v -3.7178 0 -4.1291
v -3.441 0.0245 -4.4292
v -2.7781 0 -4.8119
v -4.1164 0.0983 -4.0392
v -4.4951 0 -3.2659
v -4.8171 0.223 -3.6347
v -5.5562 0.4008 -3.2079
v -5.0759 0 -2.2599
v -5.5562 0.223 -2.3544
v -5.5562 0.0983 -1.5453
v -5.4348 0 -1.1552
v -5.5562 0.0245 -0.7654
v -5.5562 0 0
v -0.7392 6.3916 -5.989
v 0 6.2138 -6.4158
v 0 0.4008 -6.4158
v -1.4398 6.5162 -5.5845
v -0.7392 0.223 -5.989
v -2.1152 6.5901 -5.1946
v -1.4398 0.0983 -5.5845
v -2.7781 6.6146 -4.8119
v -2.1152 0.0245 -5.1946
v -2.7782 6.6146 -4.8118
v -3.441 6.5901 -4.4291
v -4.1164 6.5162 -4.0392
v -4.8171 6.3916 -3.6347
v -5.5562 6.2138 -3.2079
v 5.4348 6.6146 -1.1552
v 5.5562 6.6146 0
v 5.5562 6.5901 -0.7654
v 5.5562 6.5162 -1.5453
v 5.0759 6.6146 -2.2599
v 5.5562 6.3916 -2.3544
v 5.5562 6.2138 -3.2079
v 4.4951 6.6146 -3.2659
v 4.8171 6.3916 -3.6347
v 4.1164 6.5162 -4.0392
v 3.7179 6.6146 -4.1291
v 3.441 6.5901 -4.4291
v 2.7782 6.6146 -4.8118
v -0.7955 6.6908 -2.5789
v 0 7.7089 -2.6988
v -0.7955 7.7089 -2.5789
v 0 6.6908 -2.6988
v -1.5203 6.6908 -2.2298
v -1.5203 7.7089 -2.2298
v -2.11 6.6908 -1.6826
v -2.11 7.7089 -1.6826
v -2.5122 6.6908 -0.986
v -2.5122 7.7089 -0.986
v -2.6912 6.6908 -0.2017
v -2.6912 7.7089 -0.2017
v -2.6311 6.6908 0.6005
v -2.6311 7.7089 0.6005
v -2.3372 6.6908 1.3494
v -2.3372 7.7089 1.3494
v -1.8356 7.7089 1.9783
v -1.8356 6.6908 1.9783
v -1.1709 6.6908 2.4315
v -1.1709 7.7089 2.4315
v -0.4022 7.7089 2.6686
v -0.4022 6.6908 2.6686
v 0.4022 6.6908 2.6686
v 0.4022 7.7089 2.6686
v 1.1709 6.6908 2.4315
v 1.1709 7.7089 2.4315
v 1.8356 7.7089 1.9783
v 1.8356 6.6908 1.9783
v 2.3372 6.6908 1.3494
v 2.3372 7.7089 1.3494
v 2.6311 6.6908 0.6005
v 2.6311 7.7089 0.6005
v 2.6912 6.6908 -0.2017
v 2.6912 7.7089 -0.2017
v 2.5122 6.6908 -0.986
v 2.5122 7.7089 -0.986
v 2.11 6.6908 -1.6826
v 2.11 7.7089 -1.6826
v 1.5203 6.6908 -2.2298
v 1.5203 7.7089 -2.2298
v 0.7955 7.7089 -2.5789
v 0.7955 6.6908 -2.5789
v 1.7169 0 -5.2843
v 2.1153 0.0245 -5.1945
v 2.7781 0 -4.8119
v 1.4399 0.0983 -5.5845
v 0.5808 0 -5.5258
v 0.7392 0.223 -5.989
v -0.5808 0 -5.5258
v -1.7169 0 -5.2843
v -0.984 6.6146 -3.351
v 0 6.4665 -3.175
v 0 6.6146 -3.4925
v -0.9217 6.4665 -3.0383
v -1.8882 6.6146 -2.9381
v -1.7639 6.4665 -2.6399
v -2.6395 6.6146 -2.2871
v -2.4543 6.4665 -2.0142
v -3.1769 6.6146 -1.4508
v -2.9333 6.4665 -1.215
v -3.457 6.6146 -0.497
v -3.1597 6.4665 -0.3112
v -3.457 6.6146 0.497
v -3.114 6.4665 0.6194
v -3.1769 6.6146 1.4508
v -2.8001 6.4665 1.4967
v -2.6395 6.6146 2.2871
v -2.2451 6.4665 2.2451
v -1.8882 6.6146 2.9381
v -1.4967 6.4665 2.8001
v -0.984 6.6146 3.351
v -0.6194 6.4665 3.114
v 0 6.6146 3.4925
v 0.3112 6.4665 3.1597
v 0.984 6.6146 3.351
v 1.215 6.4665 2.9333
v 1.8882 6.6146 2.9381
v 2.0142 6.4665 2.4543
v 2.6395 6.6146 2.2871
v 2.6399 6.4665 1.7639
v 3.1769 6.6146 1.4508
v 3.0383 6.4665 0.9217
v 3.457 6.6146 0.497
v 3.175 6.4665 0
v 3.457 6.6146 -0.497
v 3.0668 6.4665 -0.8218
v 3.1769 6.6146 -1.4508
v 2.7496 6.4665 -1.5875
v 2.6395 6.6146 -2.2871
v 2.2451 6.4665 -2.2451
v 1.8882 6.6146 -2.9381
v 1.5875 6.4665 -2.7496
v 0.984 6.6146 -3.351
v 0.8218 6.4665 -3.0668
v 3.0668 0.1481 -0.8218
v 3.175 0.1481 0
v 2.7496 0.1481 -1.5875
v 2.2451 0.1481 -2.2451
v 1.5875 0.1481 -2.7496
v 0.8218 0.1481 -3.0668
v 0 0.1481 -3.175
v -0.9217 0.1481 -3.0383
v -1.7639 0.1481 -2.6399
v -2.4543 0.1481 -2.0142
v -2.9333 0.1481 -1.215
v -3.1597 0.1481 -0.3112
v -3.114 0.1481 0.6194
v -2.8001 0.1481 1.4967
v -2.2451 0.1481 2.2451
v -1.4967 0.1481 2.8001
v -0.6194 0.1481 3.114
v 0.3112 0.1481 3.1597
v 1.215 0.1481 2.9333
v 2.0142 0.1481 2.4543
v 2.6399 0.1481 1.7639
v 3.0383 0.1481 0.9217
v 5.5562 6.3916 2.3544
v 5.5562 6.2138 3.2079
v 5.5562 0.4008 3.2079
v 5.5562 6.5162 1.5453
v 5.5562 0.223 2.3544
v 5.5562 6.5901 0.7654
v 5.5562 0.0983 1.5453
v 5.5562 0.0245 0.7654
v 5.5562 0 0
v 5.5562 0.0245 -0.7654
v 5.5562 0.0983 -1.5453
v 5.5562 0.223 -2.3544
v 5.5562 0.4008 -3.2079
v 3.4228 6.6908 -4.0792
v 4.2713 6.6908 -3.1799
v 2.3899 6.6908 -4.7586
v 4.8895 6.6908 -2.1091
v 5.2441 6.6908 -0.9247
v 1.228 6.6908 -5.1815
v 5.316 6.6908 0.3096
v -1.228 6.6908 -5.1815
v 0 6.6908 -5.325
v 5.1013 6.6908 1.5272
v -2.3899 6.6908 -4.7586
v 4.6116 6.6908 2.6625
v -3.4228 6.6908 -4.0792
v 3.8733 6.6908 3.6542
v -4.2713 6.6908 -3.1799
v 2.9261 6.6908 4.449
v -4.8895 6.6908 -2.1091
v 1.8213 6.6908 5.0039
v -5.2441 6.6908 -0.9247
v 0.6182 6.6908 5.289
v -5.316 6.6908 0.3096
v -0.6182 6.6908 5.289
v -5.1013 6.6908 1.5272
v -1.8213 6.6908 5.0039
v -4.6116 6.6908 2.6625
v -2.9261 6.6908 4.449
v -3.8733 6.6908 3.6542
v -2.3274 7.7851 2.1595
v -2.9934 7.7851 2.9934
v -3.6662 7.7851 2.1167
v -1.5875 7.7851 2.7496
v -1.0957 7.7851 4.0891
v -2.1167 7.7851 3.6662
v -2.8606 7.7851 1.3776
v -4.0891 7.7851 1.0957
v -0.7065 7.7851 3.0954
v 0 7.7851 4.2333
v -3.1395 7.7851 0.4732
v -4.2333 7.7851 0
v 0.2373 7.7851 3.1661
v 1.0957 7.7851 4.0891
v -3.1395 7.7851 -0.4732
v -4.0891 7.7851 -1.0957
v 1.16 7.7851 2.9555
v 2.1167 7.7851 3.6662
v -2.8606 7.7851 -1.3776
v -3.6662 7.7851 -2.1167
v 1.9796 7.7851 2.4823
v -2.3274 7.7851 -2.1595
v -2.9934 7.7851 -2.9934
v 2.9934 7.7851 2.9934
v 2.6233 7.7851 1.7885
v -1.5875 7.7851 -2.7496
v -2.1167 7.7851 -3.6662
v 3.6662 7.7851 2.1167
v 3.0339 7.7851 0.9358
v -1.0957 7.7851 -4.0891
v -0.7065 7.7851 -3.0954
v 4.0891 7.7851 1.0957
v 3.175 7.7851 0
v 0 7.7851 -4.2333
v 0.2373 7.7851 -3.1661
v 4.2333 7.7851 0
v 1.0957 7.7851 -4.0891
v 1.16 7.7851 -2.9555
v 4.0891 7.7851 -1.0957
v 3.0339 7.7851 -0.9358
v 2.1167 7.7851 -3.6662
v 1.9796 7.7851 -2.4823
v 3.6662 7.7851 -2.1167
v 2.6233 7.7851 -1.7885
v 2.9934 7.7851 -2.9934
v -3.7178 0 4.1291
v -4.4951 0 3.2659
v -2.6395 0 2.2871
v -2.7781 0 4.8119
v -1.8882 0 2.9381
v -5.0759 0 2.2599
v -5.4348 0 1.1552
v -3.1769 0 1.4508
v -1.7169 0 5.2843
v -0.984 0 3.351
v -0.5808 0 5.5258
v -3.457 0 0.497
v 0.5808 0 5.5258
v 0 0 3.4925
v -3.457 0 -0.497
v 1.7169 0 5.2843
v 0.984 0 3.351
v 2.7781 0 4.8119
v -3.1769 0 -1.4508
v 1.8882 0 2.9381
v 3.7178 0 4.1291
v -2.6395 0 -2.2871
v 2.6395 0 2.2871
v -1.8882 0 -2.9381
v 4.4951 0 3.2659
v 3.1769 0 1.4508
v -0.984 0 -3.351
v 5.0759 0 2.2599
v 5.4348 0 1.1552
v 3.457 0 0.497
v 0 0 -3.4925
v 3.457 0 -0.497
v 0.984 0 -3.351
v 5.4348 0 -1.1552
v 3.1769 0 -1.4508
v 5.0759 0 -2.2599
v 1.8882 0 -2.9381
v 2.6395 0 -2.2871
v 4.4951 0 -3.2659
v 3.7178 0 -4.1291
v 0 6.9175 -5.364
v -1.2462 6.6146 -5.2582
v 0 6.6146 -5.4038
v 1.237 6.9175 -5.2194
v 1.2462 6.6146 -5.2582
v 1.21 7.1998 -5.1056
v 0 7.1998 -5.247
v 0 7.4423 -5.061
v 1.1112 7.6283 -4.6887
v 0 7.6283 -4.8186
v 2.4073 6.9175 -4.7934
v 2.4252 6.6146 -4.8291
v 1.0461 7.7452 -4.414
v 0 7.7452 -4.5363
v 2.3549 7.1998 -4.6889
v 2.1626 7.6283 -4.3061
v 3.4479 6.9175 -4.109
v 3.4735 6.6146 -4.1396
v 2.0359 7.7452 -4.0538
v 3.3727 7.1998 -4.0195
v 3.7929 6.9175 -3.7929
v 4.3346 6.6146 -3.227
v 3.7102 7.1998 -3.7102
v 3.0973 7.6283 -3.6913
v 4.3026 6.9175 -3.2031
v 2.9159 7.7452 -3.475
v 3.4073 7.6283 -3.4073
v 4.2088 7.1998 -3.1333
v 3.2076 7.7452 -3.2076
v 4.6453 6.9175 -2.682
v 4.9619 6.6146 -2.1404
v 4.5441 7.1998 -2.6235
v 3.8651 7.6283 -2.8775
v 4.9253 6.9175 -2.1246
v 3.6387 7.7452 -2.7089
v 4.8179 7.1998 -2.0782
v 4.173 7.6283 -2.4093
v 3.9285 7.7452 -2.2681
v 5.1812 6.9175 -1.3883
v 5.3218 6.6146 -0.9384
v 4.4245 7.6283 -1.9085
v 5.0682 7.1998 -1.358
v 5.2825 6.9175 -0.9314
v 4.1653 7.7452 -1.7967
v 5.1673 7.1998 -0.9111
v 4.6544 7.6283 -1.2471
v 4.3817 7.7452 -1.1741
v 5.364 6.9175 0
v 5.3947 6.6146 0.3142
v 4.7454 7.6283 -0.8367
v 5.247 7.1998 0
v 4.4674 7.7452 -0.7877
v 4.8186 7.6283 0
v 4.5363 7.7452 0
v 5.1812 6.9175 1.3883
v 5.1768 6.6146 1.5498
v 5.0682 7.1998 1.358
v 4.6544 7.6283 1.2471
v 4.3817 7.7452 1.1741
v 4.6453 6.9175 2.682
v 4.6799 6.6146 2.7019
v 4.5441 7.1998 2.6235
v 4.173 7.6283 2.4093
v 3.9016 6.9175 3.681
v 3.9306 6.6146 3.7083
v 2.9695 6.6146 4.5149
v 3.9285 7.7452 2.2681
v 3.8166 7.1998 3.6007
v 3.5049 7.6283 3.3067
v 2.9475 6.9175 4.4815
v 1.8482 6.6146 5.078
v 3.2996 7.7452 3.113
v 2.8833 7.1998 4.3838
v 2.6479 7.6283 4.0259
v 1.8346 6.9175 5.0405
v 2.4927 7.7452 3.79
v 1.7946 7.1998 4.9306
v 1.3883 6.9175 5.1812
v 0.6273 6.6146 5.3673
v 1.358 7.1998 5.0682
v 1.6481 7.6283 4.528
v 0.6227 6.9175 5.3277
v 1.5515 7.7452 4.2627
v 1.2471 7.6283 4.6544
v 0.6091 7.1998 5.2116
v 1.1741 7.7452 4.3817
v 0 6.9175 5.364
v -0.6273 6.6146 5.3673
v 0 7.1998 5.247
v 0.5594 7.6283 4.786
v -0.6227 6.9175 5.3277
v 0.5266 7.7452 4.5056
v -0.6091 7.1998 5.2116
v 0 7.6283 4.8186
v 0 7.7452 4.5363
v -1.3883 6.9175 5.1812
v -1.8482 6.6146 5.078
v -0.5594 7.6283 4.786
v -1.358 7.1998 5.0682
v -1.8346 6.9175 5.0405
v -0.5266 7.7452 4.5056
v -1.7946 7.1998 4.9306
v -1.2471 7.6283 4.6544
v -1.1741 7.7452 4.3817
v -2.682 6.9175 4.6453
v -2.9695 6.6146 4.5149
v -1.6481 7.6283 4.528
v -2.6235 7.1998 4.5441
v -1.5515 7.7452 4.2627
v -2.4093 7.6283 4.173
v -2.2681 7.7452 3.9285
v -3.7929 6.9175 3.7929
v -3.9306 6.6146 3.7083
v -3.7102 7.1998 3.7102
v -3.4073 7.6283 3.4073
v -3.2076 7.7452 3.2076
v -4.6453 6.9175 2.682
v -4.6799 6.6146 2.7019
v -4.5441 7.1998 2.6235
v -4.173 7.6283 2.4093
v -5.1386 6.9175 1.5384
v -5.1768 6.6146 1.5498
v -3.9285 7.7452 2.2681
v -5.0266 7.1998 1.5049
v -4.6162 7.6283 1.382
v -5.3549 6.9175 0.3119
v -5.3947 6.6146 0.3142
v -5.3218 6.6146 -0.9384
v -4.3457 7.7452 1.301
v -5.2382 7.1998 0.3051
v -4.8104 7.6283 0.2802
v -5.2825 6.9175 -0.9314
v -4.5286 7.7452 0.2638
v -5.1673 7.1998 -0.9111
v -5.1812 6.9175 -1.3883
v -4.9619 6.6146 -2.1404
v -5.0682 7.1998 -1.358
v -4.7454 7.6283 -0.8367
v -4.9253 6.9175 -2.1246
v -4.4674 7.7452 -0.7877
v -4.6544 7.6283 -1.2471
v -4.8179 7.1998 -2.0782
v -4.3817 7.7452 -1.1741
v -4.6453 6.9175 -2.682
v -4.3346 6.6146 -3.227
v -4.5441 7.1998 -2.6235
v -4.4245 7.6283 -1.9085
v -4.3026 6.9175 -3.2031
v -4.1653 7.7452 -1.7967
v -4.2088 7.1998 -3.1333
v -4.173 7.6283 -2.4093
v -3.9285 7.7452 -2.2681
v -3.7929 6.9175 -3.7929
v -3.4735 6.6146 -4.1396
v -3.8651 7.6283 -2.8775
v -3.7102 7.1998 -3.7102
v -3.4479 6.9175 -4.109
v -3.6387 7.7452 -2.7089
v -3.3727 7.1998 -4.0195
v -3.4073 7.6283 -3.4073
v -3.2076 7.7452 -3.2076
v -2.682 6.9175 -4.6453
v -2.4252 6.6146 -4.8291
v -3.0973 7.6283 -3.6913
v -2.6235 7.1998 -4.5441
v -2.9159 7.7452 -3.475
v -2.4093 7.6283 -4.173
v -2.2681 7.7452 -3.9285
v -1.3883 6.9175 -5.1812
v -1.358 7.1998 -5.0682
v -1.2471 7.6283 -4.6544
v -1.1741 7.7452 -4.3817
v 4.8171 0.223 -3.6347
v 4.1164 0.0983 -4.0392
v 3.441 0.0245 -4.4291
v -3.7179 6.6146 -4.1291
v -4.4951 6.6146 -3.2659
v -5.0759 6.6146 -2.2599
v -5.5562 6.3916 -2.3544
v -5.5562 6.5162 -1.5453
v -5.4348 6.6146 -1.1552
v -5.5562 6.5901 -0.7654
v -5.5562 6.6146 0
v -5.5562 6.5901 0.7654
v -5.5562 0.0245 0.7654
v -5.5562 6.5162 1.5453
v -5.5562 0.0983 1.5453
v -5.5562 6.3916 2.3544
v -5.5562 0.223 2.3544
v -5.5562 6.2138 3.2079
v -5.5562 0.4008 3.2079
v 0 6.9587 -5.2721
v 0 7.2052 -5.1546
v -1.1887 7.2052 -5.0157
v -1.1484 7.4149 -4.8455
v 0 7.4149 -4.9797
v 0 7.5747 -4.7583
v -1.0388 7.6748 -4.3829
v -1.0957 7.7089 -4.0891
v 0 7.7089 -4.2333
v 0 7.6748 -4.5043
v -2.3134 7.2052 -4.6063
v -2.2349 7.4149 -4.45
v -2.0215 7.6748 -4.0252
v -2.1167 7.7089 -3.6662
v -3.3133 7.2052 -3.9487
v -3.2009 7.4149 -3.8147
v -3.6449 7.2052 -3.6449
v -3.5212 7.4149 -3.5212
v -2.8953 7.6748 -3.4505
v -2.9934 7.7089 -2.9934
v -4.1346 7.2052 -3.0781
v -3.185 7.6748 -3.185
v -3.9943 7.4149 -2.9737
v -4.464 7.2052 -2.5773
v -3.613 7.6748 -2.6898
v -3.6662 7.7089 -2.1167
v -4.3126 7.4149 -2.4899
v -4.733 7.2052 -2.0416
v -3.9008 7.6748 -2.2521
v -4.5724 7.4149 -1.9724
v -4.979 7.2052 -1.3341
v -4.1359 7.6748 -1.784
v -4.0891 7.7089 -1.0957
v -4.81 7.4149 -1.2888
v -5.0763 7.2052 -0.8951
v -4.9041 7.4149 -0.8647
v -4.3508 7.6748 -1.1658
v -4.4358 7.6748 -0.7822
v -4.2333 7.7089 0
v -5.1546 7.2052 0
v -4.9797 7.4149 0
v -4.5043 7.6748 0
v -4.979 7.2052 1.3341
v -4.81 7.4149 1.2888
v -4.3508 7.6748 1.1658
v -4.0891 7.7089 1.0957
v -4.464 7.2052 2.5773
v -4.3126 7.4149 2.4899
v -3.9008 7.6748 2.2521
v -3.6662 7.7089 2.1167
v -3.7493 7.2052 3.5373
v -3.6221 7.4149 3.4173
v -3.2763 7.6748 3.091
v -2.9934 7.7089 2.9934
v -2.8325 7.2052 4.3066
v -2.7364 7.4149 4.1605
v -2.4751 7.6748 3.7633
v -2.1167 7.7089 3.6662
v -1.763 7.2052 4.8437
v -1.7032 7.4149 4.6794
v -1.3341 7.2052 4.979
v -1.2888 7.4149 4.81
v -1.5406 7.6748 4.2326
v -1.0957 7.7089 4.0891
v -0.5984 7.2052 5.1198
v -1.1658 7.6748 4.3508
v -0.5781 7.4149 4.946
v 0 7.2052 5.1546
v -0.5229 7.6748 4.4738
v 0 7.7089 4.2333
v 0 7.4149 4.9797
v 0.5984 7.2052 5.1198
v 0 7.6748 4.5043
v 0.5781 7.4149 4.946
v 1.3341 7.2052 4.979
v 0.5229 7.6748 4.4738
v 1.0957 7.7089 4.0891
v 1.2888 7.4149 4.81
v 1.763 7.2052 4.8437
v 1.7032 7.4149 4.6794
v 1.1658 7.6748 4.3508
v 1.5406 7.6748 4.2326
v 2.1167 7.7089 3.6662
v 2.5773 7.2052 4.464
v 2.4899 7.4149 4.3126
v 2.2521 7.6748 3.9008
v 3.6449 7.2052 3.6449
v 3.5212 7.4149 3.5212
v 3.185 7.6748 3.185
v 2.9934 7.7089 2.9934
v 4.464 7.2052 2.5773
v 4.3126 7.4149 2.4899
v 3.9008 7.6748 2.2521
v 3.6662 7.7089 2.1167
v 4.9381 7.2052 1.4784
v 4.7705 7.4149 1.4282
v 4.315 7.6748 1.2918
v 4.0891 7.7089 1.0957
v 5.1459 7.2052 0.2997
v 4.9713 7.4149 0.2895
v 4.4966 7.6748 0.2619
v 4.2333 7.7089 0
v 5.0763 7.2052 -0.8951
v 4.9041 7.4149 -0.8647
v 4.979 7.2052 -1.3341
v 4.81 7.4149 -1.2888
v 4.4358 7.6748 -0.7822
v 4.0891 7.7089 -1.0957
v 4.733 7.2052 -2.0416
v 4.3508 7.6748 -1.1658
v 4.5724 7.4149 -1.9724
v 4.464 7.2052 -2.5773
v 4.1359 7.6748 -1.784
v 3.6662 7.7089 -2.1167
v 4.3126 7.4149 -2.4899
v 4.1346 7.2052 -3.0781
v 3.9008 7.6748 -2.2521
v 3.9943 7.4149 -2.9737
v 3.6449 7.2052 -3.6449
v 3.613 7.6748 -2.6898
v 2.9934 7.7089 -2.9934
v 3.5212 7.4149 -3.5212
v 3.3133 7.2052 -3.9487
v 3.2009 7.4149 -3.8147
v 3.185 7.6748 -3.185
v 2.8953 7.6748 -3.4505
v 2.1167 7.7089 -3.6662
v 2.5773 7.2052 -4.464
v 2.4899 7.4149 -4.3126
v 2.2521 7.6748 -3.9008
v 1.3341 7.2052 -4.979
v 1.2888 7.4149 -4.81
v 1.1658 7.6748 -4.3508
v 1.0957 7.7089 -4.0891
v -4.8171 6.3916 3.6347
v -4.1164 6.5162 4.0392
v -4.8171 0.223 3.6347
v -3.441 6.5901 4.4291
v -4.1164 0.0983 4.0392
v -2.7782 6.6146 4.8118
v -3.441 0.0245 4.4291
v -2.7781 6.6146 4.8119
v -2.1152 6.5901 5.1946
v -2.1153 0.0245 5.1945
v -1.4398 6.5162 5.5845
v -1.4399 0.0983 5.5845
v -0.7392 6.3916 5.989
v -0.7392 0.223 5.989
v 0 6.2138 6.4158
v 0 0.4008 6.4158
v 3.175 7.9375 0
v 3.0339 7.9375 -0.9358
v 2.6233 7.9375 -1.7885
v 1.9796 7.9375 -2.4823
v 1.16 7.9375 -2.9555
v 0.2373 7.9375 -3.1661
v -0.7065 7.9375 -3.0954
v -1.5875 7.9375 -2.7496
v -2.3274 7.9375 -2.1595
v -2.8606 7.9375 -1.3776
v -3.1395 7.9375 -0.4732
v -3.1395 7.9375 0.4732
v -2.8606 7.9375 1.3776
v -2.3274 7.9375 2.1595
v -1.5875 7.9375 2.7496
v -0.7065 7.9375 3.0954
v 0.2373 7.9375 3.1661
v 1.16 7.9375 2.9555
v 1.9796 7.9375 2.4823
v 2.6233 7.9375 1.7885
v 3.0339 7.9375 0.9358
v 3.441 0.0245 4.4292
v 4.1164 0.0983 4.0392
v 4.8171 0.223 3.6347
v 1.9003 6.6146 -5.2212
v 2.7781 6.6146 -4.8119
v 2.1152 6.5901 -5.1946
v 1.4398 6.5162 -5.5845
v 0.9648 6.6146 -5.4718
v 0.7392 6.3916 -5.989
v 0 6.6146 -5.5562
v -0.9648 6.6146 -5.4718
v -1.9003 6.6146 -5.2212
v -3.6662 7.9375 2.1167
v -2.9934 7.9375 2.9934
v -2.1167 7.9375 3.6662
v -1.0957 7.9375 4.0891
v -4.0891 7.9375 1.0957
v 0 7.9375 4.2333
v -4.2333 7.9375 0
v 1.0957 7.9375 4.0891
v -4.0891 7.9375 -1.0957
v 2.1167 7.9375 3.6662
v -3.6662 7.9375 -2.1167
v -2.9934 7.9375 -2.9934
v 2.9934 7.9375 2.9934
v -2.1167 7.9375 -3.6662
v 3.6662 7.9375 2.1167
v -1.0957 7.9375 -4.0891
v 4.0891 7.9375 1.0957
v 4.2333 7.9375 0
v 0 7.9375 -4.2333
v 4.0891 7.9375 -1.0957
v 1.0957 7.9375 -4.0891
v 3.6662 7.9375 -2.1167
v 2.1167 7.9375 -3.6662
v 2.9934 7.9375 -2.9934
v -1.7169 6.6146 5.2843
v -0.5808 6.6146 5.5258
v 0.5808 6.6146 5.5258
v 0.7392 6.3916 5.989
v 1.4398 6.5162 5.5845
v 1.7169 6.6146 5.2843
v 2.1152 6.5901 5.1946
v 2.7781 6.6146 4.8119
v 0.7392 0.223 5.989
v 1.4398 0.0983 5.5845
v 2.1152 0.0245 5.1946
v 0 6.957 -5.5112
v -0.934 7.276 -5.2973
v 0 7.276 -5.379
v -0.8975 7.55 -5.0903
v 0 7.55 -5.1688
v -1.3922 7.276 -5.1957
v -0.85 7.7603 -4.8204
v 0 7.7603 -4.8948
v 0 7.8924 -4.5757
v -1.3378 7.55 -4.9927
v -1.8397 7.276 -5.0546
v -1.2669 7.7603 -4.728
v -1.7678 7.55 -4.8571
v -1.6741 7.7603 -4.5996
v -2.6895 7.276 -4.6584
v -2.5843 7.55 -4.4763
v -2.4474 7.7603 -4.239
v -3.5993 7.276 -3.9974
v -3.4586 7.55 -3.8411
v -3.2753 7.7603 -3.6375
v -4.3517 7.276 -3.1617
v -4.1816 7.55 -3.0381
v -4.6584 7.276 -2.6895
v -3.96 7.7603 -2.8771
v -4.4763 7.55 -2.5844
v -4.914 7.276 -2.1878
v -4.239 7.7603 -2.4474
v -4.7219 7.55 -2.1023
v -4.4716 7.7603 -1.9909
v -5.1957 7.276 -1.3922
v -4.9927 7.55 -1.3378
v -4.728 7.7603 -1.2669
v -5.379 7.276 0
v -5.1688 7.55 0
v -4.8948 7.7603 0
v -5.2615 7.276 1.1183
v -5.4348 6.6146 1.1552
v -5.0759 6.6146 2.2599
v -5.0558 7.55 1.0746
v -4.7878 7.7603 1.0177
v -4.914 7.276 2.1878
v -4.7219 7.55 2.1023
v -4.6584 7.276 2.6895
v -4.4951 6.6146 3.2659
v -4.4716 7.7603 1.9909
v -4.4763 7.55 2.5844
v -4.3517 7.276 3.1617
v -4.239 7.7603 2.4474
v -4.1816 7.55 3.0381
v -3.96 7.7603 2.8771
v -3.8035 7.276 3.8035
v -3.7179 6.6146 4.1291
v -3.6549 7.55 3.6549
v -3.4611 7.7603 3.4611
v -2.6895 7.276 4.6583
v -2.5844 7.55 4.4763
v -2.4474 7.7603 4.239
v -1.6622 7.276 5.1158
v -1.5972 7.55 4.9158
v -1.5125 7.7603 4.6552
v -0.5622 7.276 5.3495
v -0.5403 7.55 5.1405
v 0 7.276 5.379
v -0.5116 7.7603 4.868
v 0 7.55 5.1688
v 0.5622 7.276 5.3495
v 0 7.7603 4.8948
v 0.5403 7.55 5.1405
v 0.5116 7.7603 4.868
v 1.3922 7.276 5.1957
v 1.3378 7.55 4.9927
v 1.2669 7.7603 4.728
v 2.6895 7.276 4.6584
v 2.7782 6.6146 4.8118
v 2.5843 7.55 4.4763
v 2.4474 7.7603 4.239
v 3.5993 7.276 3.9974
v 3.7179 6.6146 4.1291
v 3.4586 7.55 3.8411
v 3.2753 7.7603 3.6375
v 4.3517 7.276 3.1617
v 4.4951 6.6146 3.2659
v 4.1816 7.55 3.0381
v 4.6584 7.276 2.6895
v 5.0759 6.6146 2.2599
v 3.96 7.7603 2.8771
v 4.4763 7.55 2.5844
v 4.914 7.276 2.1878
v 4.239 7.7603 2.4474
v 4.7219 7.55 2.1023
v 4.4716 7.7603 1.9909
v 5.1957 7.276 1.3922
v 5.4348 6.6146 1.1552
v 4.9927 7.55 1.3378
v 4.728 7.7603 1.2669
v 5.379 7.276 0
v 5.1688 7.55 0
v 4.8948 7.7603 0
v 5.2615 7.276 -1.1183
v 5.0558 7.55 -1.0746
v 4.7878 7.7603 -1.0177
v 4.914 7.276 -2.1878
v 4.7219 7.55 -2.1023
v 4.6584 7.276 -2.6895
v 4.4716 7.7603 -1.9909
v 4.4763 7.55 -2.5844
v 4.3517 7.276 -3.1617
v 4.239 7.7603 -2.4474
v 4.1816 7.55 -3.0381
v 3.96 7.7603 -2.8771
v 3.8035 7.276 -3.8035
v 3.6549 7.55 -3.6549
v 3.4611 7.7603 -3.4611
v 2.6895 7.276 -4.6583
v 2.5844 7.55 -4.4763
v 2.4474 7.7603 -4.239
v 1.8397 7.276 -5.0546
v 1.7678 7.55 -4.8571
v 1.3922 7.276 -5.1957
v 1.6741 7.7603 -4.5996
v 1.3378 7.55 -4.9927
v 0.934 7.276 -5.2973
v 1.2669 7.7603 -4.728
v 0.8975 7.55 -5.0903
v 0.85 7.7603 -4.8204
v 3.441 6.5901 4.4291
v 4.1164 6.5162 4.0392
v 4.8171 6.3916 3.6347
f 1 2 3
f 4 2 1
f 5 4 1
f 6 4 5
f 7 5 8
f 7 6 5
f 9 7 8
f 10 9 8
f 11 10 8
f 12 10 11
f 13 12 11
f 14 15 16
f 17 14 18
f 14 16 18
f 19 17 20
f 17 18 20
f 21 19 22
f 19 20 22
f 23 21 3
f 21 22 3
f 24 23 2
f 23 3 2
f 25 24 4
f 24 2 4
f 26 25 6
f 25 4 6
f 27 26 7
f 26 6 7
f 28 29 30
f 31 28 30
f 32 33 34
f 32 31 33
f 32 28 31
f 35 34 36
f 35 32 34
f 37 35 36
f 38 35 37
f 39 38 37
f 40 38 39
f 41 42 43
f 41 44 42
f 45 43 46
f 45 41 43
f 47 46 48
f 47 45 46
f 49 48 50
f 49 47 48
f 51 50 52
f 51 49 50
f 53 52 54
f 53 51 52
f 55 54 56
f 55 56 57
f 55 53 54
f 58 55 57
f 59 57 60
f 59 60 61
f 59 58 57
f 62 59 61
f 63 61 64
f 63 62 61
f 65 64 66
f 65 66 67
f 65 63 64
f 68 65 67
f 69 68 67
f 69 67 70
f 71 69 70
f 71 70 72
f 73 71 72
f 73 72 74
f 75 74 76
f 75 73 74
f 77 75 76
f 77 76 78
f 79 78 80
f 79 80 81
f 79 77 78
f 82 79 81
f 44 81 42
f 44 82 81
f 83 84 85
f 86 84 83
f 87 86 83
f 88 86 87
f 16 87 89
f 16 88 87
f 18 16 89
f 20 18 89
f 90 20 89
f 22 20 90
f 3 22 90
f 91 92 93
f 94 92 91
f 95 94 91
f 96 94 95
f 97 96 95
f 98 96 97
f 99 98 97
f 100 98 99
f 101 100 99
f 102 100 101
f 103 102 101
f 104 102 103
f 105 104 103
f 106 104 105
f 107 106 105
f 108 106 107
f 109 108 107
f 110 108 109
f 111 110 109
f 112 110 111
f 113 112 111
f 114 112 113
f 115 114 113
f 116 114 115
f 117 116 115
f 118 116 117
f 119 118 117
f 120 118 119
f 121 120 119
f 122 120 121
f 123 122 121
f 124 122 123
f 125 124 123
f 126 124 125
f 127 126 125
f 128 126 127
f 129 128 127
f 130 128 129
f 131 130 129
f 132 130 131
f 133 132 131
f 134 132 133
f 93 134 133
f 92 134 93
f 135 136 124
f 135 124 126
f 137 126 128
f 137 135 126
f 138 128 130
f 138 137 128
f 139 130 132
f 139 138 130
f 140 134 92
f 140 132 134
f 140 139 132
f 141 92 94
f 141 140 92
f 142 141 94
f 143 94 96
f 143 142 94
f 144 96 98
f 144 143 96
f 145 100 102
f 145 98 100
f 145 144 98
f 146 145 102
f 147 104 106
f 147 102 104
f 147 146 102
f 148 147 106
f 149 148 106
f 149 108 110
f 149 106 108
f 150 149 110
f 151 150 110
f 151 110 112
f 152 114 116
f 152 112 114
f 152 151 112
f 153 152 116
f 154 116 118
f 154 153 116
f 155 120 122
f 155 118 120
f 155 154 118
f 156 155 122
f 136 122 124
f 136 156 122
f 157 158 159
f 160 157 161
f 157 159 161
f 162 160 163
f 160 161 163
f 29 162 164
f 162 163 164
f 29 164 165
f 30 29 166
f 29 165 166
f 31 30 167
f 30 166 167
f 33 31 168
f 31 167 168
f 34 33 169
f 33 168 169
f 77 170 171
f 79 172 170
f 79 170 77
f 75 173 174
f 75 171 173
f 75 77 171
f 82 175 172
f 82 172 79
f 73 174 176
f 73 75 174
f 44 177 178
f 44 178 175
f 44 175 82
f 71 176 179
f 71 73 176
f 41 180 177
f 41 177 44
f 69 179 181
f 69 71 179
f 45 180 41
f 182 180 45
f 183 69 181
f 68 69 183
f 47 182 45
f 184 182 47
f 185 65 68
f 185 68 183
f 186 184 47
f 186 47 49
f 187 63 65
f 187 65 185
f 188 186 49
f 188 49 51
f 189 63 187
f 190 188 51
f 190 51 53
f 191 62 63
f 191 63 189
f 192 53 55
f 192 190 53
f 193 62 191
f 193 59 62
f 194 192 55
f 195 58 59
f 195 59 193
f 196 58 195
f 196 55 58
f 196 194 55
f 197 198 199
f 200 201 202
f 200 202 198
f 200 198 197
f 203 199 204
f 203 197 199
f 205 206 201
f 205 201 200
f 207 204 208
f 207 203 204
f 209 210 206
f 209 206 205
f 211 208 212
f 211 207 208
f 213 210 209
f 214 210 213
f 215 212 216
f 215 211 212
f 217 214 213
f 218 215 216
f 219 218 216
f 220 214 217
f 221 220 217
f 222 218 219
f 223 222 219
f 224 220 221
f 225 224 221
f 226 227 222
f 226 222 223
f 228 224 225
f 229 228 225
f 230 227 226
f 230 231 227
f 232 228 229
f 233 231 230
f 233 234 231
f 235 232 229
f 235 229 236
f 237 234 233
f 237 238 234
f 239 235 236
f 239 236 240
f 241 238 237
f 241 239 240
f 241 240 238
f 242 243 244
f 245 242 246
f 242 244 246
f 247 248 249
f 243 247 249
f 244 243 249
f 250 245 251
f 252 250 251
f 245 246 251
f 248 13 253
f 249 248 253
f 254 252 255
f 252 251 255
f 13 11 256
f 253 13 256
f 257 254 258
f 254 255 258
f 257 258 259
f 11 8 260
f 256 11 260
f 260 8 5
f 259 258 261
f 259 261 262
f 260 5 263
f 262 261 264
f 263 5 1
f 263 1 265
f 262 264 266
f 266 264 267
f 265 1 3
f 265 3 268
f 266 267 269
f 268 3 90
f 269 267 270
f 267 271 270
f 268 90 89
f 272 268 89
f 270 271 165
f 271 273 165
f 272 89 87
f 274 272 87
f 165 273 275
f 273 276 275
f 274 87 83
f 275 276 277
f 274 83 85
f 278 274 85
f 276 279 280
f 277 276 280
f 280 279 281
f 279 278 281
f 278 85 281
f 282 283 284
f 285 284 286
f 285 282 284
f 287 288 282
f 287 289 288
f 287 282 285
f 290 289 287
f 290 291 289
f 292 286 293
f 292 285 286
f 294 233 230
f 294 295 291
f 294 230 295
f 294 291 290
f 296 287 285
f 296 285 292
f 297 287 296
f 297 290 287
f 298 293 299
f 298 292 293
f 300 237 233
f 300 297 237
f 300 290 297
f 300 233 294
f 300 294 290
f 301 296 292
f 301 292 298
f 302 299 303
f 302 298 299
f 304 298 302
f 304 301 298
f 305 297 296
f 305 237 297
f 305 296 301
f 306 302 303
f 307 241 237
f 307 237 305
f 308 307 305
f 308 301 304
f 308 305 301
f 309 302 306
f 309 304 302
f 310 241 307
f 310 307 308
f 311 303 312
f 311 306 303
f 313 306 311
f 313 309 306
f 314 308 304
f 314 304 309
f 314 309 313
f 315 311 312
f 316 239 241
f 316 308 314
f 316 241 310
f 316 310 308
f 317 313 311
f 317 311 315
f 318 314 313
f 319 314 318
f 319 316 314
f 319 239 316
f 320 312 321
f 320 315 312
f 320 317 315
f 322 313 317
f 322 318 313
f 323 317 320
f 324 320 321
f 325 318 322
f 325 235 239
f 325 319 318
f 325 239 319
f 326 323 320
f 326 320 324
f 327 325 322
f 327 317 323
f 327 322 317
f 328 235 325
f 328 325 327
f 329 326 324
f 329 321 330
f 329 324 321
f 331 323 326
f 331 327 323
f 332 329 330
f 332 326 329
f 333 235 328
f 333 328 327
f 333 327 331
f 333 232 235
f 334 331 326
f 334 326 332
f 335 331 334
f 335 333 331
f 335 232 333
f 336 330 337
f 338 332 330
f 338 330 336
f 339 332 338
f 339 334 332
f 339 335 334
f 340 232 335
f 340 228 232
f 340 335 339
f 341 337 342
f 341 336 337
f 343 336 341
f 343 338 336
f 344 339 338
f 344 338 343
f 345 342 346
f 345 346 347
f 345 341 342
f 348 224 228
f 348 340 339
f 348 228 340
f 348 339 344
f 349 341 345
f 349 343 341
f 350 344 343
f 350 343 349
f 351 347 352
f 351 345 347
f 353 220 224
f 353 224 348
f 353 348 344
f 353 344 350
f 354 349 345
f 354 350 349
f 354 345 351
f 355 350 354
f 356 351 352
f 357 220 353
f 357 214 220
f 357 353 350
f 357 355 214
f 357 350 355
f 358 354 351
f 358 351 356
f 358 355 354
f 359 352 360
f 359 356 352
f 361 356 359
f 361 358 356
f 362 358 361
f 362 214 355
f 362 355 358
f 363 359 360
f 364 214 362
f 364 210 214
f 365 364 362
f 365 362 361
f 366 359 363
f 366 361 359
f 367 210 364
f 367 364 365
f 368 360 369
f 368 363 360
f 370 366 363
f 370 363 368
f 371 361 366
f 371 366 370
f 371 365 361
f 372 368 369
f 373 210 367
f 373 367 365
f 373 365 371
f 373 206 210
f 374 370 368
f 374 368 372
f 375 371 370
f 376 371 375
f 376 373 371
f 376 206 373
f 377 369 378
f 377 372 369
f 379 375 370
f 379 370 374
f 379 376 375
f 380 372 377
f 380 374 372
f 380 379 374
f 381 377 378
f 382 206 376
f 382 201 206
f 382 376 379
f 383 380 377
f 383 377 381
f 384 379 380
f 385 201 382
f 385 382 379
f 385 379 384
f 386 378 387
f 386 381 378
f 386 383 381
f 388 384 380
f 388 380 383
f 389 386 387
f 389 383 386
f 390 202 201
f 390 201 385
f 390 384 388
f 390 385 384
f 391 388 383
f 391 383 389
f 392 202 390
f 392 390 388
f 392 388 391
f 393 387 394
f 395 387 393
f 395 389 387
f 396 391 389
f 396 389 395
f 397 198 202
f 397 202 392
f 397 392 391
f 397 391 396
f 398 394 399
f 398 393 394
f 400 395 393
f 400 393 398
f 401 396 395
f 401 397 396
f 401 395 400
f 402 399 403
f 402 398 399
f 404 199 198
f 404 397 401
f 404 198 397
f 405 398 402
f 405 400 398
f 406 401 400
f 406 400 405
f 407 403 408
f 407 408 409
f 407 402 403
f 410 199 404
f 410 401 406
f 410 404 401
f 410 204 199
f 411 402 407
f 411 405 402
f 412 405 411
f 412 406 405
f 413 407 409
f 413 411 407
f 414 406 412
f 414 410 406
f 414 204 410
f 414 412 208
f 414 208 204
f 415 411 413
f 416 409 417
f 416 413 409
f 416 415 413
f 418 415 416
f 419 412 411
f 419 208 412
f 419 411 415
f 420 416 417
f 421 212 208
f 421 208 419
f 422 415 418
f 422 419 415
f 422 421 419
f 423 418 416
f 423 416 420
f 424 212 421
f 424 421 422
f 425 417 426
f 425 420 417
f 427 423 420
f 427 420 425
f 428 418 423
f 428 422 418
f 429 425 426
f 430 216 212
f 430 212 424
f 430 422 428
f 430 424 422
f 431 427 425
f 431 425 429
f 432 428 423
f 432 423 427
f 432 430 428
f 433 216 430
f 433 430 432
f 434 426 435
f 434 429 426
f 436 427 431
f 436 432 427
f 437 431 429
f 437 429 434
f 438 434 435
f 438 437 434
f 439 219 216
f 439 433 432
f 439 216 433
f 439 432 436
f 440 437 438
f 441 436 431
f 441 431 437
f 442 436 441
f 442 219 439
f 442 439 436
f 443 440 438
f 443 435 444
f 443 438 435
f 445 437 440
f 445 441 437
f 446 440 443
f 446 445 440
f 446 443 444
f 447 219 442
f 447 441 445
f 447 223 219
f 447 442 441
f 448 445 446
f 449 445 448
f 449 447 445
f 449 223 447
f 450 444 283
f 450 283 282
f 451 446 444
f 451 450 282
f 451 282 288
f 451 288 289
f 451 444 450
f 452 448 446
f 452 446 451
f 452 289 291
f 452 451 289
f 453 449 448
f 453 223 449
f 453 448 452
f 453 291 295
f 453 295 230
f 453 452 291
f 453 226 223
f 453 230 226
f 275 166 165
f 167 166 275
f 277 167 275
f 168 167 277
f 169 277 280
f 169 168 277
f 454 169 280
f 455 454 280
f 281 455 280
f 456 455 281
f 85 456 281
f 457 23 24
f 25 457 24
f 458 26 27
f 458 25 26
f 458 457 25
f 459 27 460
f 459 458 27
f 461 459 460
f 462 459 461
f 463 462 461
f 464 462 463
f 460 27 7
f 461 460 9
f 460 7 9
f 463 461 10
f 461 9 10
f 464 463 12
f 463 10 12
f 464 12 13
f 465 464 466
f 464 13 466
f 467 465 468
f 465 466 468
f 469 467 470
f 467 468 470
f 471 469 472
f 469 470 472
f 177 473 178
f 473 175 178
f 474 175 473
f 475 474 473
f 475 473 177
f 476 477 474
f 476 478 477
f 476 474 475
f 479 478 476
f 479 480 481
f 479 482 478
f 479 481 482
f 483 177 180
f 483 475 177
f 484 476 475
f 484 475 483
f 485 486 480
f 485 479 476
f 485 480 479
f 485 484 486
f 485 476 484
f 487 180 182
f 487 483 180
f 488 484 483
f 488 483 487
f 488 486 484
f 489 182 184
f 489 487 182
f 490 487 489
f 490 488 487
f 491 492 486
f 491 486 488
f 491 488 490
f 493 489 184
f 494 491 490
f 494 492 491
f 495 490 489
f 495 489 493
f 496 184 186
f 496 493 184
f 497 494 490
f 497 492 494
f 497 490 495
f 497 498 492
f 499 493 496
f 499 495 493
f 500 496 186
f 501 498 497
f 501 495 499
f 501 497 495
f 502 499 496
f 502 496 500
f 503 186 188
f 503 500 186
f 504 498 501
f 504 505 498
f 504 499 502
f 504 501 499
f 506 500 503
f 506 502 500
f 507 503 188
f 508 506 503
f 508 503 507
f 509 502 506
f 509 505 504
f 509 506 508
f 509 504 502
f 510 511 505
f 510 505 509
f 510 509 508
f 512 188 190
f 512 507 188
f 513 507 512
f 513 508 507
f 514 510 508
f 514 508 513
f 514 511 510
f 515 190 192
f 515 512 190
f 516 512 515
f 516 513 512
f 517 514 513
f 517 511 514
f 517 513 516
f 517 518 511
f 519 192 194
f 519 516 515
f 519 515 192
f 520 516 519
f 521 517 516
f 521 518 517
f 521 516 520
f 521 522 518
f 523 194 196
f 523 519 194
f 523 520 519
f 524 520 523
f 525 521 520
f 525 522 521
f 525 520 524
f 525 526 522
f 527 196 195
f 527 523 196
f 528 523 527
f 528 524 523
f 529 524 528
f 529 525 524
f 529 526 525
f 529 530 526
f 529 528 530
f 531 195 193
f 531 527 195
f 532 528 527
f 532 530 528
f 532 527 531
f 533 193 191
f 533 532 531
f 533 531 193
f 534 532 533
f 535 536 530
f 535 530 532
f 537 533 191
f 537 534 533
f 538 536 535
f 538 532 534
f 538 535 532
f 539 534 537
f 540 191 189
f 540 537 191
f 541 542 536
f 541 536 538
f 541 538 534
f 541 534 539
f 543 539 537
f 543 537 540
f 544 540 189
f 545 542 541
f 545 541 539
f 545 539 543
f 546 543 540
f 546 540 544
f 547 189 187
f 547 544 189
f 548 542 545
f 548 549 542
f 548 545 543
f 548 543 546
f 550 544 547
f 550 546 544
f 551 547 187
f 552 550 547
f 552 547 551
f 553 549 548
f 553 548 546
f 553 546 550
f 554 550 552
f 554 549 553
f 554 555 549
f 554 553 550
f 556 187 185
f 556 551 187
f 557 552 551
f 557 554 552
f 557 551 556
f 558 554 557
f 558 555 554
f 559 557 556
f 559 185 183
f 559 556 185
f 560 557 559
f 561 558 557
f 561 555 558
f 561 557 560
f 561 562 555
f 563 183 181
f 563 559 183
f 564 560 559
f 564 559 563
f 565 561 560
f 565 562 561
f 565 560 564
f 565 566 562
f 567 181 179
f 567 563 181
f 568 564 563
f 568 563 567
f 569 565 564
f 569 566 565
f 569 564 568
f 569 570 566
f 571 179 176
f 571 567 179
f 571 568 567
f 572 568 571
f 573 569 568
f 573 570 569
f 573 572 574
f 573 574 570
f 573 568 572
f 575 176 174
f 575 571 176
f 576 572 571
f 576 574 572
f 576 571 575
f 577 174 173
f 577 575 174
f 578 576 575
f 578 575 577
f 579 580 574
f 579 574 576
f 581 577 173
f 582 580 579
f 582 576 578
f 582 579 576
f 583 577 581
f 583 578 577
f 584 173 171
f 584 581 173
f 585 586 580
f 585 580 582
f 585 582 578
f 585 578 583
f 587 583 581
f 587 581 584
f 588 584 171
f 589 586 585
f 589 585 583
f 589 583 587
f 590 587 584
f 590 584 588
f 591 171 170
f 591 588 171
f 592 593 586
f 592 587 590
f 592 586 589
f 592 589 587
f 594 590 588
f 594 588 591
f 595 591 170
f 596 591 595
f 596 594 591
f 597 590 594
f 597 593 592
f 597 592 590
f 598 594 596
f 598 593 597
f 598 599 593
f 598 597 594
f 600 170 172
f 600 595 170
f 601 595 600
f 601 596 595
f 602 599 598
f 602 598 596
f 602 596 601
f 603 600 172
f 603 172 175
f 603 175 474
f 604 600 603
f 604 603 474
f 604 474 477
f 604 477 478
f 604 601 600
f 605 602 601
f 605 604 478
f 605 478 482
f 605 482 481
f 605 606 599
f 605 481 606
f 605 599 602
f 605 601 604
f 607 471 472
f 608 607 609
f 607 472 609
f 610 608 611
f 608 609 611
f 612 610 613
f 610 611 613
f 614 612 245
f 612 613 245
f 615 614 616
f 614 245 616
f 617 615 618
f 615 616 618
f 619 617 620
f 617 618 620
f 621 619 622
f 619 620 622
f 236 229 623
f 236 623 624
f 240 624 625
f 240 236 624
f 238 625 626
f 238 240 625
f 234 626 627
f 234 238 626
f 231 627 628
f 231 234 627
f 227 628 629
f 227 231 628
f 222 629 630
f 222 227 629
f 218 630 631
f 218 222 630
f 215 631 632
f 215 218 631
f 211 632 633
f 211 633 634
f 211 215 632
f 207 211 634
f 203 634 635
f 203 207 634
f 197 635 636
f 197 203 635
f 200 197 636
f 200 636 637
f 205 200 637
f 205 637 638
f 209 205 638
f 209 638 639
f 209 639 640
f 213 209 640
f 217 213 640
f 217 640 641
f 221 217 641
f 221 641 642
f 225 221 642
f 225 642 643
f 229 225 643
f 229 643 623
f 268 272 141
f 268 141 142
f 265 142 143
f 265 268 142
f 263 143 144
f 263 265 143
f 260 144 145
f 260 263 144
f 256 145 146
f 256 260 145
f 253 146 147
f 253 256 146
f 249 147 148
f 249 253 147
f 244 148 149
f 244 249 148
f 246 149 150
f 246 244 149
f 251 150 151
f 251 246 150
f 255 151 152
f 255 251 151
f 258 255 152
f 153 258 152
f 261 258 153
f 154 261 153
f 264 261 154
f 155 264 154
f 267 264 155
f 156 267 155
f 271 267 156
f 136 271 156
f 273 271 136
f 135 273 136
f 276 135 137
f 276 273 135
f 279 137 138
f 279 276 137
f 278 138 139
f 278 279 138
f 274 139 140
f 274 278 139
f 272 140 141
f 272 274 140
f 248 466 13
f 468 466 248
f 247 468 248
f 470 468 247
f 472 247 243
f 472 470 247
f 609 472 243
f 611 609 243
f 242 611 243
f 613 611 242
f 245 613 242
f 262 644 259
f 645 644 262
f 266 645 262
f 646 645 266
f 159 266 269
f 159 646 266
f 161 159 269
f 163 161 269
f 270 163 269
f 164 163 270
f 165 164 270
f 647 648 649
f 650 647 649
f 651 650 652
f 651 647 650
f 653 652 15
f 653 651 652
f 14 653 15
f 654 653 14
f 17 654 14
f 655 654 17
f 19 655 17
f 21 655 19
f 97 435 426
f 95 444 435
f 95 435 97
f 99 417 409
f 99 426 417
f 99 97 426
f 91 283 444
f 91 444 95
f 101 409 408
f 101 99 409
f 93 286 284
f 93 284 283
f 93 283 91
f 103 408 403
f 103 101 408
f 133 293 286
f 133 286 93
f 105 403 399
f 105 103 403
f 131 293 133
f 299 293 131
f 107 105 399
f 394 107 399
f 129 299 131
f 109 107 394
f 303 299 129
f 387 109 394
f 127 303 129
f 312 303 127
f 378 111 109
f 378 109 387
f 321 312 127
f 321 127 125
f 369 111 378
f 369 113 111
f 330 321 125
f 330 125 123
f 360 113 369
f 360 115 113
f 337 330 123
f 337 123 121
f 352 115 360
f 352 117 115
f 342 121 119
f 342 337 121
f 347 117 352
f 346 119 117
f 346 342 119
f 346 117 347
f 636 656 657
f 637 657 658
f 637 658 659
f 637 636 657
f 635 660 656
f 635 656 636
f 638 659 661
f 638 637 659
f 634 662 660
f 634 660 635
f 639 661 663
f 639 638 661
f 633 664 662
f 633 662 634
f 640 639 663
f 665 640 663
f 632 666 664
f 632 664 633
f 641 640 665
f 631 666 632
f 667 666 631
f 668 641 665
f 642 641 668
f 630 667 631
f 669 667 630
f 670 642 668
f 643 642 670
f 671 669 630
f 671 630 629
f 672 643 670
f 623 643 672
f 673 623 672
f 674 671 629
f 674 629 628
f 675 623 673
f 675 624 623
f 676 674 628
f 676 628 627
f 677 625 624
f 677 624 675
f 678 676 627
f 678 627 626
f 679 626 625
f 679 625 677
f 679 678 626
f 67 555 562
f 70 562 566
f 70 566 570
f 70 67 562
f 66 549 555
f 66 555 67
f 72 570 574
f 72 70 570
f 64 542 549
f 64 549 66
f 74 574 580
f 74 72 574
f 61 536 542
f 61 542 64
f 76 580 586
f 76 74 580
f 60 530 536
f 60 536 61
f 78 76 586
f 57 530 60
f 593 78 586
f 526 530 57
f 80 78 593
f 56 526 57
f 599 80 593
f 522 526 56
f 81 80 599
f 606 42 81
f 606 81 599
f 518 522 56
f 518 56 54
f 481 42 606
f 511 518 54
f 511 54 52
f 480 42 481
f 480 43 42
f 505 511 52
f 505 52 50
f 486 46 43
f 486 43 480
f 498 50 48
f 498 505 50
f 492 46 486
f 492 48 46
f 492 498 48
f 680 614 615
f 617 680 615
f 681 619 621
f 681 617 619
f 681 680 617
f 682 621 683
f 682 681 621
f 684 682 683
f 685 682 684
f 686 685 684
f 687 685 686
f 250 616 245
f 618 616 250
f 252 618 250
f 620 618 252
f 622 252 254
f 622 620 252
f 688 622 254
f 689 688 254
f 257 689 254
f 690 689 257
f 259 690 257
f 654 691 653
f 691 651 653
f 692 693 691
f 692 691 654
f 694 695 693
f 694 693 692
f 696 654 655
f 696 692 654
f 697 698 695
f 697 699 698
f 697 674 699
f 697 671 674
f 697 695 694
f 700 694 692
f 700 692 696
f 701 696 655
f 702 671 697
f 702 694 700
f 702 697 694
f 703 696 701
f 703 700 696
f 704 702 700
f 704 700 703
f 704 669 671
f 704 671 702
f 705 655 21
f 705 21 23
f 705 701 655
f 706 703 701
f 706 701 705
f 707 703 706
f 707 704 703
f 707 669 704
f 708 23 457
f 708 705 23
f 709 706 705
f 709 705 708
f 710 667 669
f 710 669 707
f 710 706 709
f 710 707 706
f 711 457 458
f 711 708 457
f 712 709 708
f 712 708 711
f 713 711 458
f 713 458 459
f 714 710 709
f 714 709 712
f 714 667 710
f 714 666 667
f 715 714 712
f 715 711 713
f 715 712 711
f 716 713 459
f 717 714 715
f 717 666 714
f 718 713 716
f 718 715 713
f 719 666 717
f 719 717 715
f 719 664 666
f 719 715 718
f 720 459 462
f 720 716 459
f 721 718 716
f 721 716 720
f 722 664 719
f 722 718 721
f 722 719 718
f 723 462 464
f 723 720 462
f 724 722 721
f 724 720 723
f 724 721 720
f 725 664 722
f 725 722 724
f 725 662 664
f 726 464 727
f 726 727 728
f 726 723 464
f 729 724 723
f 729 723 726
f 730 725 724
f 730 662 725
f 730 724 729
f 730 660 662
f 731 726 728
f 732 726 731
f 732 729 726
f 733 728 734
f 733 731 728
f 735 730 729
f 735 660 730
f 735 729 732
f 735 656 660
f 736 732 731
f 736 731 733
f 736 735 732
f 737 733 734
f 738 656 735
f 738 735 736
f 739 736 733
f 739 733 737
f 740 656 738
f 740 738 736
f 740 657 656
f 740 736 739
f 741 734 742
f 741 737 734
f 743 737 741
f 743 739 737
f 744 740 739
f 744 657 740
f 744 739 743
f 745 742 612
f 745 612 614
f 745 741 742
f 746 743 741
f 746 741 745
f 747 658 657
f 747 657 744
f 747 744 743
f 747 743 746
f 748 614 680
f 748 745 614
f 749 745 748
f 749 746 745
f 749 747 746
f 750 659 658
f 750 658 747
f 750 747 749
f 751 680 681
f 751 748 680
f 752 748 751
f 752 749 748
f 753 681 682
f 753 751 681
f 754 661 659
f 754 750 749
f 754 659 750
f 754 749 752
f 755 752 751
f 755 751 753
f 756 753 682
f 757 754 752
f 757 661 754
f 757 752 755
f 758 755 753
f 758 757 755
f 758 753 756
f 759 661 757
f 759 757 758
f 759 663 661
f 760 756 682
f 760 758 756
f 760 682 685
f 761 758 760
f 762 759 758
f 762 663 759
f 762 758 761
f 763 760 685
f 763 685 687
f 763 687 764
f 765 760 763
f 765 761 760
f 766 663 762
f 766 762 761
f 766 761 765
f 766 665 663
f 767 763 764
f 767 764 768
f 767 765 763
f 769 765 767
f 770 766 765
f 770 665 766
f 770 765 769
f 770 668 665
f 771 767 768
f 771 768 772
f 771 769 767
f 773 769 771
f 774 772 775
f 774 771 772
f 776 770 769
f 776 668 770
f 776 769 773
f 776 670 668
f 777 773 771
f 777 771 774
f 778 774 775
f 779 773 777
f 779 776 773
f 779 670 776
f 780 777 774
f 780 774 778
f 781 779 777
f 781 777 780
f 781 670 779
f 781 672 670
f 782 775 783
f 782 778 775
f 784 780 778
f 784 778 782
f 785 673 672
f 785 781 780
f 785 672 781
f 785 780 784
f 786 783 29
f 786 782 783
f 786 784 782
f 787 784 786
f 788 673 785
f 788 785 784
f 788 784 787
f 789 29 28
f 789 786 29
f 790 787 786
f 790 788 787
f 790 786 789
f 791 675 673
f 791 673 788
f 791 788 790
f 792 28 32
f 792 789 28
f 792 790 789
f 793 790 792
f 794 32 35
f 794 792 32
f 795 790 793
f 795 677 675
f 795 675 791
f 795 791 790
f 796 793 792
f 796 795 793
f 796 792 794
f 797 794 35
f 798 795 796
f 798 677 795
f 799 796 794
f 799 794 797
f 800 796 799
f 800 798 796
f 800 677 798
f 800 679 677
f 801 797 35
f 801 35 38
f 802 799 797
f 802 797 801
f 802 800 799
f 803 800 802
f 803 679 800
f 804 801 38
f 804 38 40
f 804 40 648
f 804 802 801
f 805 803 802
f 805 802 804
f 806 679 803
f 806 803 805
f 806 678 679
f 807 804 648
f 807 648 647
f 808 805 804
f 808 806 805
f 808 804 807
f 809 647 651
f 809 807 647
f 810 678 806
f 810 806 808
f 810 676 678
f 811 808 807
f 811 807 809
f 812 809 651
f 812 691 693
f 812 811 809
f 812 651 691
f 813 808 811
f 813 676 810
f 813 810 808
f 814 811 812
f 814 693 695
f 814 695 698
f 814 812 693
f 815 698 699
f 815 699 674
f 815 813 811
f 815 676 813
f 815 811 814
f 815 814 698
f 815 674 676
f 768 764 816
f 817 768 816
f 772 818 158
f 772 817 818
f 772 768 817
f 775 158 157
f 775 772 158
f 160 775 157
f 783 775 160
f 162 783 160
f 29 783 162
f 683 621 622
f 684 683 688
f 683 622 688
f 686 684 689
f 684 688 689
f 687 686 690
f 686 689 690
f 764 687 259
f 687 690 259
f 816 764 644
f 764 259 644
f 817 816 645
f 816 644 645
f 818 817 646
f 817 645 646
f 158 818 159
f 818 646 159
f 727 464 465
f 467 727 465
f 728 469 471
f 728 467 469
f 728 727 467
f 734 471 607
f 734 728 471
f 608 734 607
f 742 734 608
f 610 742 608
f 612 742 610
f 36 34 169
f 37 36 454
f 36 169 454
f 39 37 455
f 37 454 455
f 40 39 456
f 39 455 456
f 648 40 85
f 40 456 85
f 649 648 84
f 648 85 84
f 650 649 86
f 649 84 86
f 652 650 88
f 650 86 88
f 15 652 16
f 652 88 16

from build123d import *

# Parameters (mm, degrees)
SKETCH13_R     = 3.175
EXTRUDE1_DEPTH = 7.9375


with BuildPart() as part:
    # Sketch13 → Extrude1 (new body)
    with BuildSketch(Plane(origin=(0, 0, 0), x_dir=(1, 0, 0), z_dir=(0, 1, 0))):
        Polygon((0, 6.415804866), (-5.55625, 3.207902433), (-5.55625, -3.207902433), (0, -6.415804866), (5.55625, -3.207902433), (5.55625, 3.207902433), align=None)
        Circle(SKETCH13_R, mode=Mode.SUBTRACT)
    extrude(amount=EXTRUDE1_DEPTH)

    # Sketch5 → Cut-Revolve3 (revolve, cut)
    with BuildSketch(Plane(origin=(0, 0, 0), x_dir=(0, 0, -1), z_dir=(1, 0, 0))):
        with BuildLine():
            Line((0, 0), (5.55625, 0))
            Line((5.55625, 0), (6.415804866, 0.400817017))
            Line((6.415804866, 0.400817017), (6.415804866, 6.213766317))
            Line((6.415804866, 6.213766317), (5.55625, 6.614583333))
            ThreePointArc((5.55625, 6.614583333), (5.168776679, 7.550026679), (4.233333333, 7.9375))
            Line((4.233333333, 7.9375), (4.233333333, 9.2075))
            Line((4.233333333, 9.2075), (7.685804866, 9.2075))
            Line((7.685804866, 9.2075), (7.685804866, -1.27))
            Line((7.685804866, -1.27), (0, -1.27))
            Line((0, -1.27), (0, 0))
        make_face()
    revolve(axis=Axis((0, 0, 0), (0, 1, 0)), mode=Mode.SUBTRACT)

    # Sketch6 → Cut-Revolve4 (revolve, cut)
    with BuildSketch(Plane(origin=(0, 0, 0), x_dir=(0, 0, -1), z_dir=(1, 0, 0))):
        with BuildLine():
            Line((0, 6.614583333), (5.40385, 6.614583333))
            ThreePointArc((5.40385, 6.614583333), (5.061013606, 7.442263606), (4.233333333, 7.7851))
            Line((4.233333333, 7.7851), (2.116666667, 7.7851))
            Line((2.116666667, 7.7851), (2.116666667, 9.2075))
            Line((2.116666667, 9.2075), (0, 9.2075))
            Line((0, 9.2075), (0, 6.614583333))
        make_face()
    revolve(axis=Axis((0, 9.2075, 0), (0, -1, 0)), mode=Mode.SUBTRACT)

    # Sketch4 → Cut-Revolve2 (revolve, cut)
    with BuildSketch(Plane(origin=(0, 0, 0), x_dir=(0, 0, -1), z_dir=(1, 0, 0))):
        Polygon((0, 6.614583333), (3.4925, 6.614583333), (0, 4.986003837), align=None)
        Polygon((0, 1.628579496), (3.4925, 0), (0, 0), align=None)
    revolve(axis=Axis((0, 0, 0), (0, 1, 0)), mode=Mode.SUBTRACT)


with BuildPart() as body_2:
    # Sketch7 → Revolve2 (revolve)
    with BuildSketch(Plane(origin=(0, 0, 0), x_dir=(0, 0, -1), z_dir=(1, 0, 0))):
        with BuildLine():
            Line((2.69875, 6.690783333), (5.324993778, 6.690783333))
            ThreePointArc((5.324993778, 6.690783333), (4.979705237, 7.4148695), (4.233333333, 7.7089))
            Line((4.233333333, 7.7089), (2.69875, 7.7089))
            Line((2.69875, 7.7089), (2.69875, 6.690783333))
        make_face()
    revolve(axis=Axis((0, 6.690783333, 0), (0, 1, 0)))


solid = Compound([part.part, body_2.part])
